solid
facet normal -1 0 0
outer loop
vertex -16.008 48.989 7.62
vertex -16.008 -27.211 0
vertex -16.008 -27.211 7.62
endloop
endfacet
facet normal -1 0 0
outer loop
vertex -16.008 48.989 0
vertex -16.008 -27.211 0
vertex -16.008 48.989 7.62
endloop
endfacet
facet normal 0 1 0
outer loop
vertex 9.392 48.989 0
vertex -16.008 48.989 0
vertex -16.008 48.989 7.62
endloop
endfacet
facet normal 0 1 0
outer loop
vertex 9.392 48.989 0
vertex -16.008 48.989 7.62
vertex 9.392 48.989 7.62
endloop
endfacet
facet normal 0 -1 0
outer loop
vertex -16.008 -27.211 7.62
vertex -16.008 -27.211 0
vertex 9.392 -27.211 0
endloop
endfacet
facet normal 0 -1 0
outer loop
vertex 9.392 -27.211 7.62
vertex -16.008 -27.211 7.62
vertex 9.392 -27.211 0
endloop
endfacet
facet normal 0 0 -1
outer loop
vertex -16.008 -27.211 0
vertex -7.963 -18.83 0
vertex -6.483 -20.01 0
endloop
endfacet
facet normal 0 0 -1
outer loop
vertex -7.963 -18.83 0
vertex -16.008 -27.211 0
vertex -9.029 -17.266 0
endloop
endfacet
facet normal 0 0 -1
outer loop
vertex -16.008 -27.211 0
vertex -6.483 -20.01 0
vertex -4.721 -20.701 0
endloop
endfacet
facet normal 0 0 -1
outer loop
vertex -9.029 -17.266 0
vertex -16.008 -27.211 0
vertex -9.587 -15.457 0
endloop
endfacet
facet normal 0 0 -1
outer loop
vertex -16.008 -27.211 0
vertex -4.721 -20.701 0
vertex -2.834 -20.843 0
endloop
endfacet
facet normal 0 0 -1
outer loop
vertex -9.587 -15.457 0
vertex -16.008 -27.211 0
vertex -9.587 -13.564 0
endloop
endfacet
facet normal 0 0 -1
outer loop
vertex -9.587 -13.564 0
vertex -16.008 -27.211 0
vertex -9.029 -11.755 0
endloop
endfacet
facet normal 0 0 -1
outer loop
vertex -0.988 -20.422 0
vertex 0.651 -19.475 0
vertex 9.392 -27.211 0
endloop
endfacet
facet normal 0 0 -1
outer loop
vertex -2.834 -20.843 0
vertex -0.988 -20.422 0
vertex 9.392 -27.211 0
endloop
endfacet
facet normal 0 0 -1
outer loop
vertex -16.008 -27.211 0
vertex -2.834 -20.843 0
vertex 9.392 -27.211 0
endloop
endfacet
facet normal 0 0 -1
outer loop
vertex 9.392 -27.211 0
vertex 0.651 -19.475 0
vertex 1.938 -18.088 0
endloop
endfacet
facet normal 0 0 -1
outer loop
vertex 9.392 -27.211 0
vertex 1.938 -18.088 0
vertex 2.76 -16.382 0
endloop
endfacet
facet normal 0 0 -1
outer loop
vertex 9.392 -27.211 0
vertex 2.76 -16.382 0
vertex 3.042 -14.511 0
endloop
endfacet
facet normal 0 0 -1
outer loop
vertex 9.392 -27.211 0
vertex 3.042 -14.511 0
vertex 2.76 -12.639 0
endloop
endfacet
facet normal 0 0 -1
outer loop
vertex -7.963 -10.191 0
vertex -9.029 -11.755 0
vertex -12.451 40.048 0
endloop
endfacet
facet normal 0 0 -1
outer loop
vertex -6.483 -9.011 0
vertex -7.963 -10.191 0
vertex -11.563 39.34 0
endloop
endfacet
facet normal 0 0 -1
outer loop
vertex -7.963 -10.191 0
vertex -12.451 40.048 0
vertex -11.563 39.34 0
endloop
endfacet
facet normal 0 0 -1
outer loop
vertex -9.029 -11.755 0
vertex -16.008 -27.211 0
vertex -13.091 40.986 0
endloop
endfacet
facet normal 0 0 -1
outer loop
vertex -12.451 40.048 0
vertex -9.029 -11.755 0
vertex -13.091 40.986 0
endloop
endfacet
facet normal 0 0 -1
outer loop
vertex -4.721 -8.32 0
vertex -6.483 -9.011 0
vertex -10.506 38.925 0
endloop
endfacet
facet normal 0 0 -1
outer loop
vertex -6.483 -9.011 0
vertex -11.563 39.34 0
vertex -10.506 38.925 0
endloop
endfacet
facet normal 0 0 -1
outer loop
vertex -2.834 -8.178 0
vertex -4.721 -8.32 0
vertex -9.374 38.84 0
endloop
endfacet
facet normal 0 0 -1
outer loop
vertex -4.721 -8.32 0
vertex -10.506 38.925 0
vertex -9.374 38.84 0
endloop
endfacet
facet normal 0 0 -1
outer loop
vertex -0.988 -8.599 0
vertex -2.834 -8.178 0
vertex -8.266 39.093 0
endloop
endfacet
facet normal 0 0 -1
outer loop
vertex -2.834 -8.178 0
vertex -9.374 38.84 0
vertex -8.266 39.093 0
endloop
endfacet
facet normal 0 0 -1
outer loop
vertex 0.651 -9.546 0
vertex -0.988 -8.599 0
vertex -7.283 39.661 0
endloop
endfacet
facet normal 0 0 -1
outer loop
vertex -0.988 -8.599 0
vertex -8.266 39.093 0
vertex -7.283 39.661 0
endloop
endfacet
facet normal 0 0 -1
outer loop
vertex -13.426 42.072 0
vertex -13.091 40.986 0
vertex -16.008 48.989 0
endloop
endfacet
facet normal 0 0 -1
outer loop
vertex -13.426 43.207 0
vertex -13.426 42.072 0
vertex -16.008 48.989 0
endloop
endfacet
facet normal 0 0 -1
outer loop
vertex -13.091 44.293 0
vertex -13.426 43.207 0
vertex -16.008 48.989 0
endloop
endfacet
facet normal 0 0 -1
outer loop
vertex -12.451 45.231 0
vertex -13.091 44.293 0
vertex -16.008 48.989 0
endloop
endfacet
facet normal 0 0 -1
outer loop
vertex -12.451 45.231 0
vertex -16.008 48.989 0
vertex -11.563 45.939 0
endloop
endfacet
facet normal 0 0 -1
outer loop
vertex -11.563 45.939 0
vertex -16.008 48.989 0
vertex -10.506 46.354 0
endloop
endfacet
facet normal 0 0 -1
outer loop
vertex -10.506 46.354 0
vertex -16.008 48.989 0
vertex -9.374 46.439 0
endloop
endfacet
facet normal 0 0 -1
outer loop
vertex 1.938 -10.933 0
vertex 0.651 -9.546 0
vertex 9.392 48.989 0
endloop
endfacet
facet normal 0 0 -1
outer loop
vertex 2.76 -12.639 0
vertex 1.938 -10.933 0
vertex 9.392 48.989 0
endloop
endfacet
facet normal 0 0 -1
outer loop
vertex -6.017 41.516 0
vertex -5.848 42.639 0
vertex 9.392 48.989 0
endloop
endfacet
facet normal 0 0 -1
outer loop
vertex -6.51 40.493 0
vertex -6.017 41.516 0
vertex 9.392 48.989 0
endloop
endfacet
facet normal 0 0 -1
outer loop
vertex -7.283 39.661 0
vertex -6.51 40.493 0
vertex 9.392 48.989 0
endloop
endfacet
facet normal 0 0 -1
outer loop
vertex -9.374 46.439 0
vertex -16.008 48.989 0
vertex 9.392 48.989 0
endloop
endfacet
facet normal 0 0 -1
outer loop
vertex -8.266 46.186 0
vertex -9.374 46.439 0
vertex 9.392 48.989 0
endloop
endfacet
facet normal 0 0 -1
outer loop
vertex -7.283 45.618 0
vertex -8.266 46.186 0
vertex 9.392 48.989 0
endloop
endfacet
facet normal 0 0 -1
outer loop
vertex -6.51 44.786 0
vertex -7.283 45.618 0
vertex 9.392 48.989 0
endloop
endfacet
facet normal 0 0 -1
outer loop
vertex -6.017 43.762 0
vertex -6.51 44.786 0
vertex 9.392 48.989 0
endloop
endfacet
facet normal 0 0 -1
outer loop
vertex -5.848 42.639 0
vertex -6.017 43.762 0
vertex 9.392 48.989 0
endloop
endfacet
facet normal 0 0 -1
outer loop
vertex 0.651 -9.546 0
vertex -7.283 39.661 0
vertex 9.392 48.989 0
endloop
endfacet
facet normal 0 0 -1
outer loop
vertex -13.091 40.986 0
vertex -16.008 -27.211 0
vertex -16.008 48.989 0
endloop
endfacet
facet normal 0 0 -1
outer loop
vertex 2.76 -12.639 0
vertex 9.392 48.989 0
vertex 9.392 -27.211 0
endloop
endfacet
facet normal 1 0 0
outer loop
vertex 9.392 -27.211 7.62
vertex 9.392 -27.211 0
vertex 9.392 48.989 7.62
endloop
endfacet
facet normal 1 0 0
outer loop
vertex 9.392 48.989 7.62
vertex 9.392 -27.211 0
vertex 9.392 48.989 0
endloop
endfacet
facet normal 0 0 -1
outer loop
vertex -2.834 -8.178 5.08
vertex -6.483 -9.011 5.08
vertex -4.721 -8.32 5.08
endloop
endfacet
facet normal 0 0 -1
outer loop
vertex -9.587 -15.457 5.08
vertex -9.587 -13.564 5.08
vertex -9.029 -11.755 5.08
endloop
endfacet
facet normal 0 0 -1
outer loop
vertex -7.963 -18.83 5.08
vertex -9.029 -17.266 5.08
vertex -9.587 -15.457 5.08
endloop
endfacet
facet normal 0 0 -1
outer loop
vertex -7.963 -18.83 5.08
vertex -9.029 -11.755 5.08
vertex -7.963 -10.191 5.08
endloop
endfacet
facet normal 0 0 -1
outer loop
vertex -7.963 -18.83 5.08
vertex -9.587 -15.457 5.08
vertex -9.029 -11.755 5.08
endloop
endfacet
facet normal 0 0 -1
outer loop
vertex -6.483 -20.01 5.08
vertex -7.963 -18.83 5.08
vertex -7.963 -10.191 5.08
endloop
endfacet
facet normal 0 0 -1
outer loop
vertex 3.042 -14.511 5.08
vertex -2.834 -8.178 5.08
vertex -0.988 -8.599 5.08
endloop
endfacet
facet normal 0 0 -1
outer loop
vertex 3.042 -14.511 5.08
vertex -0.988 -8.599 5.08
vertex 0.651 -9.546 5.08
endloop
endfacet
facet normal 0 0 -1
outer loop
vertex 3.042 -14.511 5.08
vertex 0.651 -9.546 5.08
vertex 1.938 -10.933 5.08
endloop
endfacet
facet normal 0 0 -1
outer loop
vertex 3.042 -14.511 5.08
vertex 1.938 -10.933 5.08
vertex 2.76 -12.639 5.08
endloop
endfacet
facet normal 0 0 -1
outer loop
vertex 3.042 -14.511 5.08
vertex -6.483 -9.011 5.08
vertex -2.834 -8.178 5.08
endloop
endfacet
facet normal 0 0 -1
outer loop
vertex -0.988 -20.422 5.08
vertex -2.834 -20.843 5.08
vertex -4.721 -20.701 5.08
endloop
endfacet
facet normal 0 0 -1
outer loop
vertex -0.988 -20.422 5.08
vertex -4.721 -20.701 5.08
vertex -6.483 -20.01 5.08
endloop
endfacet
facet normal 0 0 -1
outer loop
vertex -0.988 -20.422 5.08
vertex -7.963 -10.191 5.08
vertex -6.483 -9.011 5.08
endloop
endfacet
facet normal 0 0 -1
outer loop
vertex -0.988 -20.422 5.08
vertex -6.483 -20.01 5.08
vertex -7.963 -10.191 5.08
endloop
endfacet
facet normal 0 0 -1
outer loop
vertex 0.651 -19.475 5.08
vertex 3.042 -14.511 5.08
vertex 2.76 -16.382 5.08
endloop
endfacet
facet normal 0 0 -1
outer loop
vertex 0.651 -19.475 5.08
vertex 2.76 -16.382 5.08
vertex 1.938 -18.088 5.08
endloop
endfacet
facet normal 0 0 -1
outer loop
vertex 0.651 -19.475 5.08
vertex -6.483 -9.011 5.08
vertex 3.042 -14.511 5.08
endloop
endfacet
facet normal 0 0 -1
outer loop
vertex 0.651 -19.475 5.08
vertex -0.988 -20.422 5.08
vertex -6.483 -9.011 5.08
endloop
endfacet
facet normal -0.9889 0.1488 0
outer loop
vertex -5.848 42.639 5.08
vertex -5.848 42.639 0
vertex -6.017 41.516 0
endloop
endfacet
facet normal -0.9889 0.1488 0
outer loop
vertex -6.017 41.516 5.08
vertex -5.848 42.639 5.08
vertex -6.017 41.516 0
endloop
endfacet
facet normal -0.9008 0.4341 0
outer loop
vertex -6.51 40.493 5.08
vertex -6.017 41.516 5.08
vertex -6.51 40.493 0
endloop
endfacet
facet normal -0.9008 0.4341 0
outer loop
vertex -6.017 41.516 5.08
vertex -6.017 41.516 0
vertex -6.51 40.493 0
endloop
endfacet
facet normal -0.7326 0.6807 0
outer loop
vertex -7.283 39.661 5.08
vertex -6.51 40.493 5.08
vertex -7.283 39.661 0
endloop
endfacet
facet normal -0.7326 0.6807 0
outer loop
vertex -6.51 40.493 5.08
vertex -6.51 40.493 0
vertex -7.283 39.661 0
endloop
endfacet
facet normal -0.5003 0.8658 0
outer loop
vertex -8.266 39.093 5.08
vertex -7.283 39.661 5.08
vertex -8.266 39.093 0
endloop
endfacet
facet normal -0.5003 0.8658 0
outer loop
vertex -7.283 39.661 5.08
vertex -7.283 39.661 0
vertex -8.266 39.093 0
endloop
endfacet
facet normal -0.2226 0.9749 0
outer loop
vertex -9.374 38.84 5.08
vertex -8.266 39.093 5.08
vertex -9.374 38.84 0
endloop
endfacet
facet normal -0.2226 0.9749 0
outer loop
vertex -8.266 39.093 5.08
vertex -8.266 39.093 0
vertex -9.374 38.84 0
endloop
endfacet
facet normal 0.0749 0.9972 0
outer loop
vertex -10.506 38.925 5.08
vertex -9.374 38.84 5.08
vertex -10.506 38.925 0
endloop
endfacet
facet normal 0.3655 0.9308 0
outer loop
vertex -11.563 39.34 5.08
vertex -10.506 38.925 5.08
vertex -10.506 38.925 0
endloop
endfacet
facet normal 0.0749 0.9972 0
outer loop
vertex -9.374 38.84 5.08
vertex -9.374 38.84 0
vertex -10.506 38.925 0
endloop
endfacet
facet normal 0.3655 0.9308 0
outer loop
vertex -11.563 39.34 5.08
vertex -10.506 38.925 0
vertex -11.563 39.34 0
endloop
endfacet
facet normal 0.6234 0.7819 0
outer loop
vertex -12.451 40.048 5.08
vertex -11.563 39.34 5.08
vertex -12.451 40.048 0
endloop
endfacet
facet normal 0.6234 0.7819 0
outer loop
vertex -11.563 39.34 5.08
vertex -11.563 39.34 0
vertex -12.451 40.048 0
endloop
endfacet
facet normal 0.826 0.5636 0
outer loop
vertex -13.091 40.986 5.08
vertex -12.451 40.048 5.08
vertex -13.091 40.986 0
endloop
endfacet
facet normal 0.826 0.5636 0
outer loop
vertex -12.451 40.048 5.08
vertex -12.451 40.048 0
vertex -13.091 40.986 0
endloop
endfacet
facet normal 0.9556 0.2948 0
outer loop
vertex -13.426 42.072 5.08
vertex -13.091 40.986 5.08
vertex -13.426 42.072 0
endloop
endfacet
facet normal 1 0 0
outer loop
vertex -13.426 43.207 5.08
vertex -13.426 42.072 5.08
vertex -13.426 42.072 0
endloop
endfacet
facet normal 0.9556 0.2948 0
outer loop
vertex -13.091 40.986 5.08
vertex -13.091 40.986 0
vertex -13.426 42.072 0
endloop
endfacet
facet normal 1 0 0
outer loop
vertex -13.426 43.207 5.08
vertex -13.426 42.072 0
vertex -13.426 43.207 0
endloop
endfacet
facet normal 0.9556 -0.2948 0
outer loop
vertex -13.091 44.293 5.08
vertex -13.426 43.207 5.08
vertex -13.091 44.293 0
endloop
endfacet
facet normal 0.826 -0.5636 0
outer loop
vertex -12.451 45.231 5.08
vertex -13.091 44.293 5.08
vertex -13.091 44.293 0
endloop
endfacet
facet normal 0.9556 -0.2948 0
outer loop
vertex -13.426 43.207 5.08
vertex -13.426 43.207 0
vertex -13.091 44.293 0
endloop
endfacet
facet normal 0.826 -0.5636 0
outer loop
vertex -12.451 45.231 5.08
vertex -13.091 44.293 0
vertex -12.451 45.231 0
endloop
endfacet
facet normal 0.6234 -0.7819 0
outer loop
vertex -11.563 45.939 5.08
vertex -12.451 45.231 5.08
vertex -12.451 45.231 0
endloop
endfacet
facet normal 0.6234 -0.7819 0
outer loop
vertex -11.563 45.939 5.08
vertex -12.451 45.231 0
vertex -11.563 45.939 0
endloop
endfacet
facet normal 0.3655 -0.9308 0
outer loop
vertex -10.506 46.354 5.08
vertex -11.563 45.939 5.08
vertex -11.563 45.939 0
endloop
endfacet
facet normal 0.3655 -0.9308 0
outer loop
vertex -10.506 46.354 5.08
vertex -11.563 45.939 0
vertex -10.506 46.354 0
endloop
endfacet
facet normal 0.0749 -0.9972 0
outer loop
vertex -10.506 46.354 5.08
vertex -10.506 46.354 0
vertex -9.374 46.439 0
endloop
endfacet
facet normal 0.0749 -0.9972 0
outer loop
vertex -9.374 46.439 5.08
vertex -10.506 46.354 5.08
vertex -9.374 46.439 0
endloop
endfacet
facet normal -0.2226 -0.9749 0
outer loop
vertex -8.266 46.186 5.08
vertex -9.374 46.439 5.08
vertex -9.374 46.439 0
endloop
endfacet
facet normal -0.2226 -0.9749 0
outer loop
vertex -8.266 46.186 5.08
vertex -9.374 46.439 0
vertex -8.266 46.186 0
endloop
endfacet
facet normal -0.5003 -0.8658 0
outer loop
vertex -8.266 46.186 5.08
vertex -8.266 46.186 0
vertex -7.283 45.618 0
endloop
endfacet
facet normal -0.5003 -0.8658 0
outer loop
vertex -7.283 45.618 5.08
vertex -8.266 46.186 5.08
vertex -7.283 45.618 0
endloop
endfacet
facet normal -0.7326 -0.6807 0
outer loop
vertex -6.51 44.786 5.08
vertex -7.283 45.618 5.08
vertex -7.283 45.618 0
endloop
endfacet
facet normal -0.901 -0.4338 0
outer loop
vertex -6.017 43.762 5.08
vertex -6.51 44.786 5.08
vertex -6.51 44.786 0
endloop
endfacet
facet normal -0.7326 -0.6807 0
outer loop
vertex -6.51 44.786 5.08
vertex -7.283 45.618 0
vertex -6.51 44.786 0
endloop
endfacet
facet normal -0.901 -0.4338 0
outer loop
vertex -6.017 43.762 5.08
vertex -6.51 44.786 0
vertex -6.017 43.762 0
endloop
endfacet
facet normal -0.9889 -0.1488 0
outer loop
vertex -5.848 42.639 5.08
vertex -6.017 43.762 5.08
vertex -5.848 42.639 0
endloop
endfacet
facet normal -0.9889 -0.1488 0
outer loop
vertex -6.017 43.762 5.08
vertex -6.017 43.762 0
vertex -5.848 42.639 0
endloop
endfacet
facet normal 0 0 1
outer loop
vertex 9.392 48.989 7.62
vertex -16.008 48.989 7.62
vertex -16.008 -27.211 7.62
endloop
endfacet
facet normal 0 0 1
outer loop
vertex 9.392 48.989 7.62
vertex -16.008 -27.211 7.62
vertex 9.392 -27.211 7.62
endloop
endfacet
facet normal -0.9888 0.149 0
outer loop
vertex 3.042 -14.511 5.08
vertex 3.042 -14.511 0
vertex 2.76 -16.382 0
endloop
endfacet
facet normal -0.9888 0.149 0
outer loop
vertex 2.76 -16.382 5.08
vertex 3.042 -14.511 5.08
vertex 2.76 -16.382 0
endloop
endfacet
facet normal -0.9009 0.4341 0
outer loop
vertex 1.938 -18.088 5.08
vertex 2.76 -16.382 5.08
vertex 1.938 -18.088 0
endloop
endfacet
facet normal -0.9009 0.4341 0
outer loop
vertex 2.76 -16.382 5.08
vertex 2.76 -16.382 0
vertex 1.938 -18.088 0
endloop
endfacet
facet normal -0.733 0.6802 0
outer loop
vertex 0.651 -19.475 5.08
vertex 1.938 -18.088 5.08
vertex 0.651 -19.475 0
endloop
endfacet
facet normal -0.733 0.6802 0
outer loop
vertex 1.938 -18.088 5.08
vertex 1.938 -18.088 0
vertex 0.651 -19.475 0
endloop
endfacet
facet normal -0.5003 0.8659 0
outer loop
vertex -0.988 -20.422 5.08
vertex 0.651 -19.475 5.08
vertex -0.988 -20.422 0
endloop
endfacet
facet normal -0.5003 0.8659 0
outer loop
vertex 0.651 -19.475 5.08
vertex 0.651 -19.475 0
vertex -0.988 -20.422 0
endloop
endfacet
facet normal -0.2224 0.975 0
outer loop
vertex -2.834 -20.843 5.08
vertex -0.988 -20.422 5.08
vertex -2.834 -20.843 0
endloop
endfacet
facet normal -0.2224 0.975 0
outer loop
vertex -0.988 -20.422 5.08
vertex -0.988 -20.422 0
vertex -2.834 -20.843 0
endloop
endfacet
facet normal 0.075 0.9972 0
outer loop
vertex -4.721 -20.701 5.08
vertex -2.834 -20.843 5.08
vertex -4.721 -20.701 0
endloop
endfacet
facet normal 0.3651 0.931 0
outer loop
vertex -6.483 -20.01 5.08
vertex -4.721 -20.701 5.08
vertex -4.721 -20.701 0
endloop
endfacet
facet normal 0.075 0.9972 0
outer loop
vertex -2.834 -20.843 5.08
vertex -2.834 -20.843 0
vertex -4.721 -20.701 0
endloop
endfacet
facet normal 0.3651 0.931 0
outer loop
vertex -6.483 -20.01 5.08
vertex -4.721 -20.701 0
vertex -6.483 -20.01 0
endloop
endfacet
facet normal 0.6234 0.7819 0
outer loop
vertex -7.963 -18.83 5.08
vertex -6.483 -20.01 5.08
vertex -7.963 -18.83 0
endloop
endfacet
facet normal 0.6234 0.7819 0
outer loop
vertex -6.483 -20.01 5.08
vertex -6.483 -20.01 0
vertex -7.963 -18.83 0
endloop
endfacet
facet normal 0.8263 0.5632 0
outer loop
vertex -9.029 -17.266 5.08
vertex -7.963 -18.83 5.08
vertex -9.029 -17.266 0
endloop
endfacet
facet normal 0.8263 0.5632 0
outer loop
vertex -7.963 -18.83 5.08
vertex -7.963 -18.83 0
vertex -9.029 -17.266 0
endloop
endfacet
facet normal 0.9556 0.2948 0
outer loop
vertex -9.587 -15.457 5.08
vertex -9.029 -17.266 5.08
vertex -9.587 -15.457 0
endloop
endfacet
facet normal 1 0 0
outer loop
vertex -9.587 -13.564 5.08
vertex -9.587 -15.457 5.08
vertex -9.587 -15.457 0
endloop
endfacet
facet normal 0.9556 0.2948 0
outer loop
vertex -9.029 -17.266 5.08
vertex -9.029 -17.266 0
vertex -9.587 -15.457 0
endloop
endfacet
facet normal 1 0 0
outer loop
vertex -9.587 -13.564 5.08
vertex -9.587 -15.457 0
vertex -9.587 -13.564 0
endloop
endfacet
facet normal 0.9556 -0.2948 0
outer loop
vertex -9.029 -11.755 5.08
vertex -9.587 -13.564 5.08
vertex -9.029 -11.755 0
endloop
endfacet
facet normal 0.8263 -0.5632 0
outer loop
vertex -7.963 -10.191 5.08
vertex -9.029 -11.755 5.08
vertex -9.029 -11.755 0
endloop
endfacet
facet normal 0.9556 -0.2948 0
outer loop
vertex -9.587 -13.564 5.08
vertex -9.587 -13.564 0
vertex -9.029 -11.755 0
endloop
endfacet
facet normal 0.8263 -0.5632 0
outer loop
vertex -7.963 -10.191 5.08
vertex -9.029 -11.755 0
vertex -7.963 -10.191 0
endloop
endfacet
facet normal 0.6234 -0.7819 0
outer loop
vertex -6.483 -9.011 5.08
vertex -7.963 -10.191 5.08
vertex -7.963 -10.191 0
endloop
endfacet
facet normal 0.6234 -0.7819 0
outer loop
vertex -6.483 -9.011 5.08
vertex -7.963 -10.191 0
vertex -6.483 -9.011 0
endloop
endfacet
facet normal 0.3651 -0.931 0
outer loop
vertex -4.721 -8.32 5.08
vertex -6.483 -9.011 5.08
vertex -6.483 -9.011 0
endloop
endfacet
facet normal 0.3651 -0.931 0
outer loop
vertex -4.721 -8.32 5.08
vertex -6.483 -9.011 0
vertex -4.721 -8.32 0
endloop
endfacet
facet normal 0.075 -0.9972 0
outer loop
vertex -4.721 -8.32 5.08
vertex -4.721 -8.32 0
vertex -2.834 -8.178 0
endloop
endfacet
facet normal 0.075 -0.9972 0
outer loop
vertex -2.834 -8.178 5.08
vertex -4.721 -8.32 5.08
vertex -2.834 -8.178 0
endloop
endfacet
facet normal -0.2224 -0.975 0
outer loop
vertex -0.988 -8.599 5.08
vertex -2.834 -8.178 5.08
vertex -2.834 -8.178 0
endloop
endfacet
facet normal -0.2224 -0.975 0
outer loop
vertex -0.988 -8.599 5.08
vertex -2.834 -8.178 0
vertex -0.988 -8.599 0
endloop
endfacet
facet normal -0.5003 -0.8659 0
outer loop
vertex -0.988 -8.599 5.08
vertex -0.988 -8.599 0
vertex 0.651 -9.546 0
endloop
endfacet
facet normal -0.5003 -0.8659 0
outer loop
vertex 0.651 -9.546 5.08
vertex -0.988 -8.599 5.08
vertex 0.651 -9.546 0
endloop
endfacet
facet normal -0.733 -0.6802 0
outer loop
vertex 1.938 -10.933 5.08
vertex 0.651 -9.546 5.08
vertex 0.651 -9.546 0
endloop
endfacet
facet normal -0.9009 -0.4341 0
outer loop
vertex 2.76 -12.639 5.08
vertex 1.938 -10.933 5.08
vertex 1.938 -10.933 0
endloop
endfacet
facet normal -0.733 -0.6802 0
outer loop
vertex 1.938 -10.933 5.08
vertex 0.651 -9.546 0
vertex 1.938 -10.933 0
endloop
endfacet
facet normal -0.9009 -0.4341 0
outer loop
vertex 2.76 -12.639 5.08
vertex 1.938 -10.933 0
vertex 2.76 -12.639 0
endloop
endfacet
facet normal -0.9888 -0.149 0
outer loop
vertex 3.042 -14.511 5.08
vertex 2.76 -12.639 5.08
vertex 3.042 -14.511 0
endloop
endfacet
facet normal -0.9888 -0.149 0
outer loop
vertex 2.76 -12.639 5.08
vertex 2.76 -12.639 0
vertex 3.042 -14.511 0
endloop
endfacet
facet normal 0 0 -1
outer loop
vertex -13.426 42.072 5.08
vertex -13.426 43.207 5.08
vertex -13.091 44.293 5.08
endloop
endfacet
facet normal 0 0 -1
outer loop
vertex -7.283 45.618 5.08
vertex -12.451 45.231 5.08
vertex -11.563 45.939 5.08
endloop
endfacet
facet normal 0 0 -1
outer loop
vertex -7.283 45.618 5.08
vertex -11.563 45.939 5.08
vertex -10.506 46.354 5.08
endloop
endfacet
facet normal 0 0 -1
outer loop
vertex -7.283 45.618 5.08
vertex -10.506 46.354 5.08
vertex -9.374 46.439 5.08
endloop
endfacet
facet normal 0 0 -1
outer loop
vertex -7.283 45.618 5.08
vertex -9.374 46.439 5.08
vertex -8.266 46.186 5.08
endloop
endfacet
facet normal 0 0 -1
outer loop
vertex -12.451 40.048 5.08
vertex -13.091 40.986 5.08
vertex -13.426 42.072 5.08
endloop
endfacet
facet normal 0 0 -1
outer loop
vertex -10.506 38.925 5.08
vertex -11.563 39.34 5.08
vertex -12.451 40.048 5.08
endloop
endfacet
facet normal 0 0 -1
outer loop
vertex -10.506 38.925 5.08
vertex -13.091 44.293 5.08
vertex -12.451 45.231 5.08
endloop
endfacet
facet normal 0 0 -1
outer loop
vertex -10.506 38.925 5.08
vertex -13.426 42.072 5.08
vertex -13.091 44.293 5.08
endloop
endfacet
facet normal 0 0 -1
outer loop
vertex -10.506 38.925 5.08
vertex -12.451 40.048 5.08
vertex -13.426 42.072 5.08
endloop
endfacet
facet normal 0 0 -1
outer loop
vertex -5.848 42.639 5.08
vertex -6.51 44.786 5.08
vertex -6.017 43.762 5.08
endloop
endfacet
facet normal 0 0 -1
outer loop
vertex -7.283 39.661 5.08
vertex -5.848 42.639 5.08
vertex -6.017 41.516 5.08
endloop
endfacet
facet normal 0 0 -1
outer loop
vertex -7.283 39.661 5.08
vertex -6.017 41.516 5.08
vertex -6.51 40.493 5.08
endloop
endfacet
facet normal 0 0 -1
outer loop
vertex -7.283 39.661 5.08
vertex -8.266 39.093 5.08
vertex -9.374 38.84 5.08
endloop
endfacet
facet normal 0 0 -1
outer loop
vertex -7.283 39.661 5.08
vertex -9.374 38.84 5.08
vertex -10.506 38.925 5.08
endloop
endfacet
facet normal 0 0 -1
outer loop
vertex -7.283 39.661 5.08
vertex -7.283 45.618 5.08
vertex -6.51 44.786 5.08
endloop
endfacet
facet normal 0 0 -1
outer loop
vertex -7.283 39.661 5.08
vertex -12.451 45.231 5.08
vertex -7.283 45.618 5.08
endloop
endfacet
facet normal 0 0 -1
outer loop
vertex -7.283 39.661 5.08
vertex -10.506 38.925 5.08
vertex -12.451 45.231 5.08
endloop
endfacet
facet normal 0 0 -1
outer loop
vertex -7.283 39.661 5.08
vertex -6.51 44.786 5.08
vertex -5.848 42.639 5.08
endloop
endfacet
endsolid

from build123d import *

# Parameters (mm, degrees)
F0_W     = 25.4
F0_H     = 76.2
F1_DEPTH = 7.62
F2_R     = 6.35
F3_DEPTH = 5.08
F4_R     = 3.81
F5_DEPTH = 5.08


with BuildPart() as f1:
    # F0 (on Top) → F1 (new body)
    with BuildSketch(Plane.XY):
        with Locations((-3.308222, 10.889477)):
            Rectangle(F0_W, F0_H)
    extrude(amount=F1_DEPTH)

    # F2 (on face) → F3 (cut)
    with BuildSketch(Plane(origin=(0, 0, 0), x_dir=(1, 0, 0), z_dir=(0, 0, -1))):
        with Locations((-3.308222, 14.510523)):
            Circle(F2_R)
    extrude(amount=-F3_DEPTH, mode=Mode.SUBTRACT)

    # F4 (on face) → F5 (cut)
    with BuildSketch(Plane(origin=(0, 0, 0), x_dir=(1, 0, 0), z_dir=(0, 0, -1))):
        with Locations((-9.658222, -42.639477)):
            Circle(F4_R)
    extrude(amount=-F5_DEPTH, mode=Mode.SUBTRACT)


solid = f1.part
